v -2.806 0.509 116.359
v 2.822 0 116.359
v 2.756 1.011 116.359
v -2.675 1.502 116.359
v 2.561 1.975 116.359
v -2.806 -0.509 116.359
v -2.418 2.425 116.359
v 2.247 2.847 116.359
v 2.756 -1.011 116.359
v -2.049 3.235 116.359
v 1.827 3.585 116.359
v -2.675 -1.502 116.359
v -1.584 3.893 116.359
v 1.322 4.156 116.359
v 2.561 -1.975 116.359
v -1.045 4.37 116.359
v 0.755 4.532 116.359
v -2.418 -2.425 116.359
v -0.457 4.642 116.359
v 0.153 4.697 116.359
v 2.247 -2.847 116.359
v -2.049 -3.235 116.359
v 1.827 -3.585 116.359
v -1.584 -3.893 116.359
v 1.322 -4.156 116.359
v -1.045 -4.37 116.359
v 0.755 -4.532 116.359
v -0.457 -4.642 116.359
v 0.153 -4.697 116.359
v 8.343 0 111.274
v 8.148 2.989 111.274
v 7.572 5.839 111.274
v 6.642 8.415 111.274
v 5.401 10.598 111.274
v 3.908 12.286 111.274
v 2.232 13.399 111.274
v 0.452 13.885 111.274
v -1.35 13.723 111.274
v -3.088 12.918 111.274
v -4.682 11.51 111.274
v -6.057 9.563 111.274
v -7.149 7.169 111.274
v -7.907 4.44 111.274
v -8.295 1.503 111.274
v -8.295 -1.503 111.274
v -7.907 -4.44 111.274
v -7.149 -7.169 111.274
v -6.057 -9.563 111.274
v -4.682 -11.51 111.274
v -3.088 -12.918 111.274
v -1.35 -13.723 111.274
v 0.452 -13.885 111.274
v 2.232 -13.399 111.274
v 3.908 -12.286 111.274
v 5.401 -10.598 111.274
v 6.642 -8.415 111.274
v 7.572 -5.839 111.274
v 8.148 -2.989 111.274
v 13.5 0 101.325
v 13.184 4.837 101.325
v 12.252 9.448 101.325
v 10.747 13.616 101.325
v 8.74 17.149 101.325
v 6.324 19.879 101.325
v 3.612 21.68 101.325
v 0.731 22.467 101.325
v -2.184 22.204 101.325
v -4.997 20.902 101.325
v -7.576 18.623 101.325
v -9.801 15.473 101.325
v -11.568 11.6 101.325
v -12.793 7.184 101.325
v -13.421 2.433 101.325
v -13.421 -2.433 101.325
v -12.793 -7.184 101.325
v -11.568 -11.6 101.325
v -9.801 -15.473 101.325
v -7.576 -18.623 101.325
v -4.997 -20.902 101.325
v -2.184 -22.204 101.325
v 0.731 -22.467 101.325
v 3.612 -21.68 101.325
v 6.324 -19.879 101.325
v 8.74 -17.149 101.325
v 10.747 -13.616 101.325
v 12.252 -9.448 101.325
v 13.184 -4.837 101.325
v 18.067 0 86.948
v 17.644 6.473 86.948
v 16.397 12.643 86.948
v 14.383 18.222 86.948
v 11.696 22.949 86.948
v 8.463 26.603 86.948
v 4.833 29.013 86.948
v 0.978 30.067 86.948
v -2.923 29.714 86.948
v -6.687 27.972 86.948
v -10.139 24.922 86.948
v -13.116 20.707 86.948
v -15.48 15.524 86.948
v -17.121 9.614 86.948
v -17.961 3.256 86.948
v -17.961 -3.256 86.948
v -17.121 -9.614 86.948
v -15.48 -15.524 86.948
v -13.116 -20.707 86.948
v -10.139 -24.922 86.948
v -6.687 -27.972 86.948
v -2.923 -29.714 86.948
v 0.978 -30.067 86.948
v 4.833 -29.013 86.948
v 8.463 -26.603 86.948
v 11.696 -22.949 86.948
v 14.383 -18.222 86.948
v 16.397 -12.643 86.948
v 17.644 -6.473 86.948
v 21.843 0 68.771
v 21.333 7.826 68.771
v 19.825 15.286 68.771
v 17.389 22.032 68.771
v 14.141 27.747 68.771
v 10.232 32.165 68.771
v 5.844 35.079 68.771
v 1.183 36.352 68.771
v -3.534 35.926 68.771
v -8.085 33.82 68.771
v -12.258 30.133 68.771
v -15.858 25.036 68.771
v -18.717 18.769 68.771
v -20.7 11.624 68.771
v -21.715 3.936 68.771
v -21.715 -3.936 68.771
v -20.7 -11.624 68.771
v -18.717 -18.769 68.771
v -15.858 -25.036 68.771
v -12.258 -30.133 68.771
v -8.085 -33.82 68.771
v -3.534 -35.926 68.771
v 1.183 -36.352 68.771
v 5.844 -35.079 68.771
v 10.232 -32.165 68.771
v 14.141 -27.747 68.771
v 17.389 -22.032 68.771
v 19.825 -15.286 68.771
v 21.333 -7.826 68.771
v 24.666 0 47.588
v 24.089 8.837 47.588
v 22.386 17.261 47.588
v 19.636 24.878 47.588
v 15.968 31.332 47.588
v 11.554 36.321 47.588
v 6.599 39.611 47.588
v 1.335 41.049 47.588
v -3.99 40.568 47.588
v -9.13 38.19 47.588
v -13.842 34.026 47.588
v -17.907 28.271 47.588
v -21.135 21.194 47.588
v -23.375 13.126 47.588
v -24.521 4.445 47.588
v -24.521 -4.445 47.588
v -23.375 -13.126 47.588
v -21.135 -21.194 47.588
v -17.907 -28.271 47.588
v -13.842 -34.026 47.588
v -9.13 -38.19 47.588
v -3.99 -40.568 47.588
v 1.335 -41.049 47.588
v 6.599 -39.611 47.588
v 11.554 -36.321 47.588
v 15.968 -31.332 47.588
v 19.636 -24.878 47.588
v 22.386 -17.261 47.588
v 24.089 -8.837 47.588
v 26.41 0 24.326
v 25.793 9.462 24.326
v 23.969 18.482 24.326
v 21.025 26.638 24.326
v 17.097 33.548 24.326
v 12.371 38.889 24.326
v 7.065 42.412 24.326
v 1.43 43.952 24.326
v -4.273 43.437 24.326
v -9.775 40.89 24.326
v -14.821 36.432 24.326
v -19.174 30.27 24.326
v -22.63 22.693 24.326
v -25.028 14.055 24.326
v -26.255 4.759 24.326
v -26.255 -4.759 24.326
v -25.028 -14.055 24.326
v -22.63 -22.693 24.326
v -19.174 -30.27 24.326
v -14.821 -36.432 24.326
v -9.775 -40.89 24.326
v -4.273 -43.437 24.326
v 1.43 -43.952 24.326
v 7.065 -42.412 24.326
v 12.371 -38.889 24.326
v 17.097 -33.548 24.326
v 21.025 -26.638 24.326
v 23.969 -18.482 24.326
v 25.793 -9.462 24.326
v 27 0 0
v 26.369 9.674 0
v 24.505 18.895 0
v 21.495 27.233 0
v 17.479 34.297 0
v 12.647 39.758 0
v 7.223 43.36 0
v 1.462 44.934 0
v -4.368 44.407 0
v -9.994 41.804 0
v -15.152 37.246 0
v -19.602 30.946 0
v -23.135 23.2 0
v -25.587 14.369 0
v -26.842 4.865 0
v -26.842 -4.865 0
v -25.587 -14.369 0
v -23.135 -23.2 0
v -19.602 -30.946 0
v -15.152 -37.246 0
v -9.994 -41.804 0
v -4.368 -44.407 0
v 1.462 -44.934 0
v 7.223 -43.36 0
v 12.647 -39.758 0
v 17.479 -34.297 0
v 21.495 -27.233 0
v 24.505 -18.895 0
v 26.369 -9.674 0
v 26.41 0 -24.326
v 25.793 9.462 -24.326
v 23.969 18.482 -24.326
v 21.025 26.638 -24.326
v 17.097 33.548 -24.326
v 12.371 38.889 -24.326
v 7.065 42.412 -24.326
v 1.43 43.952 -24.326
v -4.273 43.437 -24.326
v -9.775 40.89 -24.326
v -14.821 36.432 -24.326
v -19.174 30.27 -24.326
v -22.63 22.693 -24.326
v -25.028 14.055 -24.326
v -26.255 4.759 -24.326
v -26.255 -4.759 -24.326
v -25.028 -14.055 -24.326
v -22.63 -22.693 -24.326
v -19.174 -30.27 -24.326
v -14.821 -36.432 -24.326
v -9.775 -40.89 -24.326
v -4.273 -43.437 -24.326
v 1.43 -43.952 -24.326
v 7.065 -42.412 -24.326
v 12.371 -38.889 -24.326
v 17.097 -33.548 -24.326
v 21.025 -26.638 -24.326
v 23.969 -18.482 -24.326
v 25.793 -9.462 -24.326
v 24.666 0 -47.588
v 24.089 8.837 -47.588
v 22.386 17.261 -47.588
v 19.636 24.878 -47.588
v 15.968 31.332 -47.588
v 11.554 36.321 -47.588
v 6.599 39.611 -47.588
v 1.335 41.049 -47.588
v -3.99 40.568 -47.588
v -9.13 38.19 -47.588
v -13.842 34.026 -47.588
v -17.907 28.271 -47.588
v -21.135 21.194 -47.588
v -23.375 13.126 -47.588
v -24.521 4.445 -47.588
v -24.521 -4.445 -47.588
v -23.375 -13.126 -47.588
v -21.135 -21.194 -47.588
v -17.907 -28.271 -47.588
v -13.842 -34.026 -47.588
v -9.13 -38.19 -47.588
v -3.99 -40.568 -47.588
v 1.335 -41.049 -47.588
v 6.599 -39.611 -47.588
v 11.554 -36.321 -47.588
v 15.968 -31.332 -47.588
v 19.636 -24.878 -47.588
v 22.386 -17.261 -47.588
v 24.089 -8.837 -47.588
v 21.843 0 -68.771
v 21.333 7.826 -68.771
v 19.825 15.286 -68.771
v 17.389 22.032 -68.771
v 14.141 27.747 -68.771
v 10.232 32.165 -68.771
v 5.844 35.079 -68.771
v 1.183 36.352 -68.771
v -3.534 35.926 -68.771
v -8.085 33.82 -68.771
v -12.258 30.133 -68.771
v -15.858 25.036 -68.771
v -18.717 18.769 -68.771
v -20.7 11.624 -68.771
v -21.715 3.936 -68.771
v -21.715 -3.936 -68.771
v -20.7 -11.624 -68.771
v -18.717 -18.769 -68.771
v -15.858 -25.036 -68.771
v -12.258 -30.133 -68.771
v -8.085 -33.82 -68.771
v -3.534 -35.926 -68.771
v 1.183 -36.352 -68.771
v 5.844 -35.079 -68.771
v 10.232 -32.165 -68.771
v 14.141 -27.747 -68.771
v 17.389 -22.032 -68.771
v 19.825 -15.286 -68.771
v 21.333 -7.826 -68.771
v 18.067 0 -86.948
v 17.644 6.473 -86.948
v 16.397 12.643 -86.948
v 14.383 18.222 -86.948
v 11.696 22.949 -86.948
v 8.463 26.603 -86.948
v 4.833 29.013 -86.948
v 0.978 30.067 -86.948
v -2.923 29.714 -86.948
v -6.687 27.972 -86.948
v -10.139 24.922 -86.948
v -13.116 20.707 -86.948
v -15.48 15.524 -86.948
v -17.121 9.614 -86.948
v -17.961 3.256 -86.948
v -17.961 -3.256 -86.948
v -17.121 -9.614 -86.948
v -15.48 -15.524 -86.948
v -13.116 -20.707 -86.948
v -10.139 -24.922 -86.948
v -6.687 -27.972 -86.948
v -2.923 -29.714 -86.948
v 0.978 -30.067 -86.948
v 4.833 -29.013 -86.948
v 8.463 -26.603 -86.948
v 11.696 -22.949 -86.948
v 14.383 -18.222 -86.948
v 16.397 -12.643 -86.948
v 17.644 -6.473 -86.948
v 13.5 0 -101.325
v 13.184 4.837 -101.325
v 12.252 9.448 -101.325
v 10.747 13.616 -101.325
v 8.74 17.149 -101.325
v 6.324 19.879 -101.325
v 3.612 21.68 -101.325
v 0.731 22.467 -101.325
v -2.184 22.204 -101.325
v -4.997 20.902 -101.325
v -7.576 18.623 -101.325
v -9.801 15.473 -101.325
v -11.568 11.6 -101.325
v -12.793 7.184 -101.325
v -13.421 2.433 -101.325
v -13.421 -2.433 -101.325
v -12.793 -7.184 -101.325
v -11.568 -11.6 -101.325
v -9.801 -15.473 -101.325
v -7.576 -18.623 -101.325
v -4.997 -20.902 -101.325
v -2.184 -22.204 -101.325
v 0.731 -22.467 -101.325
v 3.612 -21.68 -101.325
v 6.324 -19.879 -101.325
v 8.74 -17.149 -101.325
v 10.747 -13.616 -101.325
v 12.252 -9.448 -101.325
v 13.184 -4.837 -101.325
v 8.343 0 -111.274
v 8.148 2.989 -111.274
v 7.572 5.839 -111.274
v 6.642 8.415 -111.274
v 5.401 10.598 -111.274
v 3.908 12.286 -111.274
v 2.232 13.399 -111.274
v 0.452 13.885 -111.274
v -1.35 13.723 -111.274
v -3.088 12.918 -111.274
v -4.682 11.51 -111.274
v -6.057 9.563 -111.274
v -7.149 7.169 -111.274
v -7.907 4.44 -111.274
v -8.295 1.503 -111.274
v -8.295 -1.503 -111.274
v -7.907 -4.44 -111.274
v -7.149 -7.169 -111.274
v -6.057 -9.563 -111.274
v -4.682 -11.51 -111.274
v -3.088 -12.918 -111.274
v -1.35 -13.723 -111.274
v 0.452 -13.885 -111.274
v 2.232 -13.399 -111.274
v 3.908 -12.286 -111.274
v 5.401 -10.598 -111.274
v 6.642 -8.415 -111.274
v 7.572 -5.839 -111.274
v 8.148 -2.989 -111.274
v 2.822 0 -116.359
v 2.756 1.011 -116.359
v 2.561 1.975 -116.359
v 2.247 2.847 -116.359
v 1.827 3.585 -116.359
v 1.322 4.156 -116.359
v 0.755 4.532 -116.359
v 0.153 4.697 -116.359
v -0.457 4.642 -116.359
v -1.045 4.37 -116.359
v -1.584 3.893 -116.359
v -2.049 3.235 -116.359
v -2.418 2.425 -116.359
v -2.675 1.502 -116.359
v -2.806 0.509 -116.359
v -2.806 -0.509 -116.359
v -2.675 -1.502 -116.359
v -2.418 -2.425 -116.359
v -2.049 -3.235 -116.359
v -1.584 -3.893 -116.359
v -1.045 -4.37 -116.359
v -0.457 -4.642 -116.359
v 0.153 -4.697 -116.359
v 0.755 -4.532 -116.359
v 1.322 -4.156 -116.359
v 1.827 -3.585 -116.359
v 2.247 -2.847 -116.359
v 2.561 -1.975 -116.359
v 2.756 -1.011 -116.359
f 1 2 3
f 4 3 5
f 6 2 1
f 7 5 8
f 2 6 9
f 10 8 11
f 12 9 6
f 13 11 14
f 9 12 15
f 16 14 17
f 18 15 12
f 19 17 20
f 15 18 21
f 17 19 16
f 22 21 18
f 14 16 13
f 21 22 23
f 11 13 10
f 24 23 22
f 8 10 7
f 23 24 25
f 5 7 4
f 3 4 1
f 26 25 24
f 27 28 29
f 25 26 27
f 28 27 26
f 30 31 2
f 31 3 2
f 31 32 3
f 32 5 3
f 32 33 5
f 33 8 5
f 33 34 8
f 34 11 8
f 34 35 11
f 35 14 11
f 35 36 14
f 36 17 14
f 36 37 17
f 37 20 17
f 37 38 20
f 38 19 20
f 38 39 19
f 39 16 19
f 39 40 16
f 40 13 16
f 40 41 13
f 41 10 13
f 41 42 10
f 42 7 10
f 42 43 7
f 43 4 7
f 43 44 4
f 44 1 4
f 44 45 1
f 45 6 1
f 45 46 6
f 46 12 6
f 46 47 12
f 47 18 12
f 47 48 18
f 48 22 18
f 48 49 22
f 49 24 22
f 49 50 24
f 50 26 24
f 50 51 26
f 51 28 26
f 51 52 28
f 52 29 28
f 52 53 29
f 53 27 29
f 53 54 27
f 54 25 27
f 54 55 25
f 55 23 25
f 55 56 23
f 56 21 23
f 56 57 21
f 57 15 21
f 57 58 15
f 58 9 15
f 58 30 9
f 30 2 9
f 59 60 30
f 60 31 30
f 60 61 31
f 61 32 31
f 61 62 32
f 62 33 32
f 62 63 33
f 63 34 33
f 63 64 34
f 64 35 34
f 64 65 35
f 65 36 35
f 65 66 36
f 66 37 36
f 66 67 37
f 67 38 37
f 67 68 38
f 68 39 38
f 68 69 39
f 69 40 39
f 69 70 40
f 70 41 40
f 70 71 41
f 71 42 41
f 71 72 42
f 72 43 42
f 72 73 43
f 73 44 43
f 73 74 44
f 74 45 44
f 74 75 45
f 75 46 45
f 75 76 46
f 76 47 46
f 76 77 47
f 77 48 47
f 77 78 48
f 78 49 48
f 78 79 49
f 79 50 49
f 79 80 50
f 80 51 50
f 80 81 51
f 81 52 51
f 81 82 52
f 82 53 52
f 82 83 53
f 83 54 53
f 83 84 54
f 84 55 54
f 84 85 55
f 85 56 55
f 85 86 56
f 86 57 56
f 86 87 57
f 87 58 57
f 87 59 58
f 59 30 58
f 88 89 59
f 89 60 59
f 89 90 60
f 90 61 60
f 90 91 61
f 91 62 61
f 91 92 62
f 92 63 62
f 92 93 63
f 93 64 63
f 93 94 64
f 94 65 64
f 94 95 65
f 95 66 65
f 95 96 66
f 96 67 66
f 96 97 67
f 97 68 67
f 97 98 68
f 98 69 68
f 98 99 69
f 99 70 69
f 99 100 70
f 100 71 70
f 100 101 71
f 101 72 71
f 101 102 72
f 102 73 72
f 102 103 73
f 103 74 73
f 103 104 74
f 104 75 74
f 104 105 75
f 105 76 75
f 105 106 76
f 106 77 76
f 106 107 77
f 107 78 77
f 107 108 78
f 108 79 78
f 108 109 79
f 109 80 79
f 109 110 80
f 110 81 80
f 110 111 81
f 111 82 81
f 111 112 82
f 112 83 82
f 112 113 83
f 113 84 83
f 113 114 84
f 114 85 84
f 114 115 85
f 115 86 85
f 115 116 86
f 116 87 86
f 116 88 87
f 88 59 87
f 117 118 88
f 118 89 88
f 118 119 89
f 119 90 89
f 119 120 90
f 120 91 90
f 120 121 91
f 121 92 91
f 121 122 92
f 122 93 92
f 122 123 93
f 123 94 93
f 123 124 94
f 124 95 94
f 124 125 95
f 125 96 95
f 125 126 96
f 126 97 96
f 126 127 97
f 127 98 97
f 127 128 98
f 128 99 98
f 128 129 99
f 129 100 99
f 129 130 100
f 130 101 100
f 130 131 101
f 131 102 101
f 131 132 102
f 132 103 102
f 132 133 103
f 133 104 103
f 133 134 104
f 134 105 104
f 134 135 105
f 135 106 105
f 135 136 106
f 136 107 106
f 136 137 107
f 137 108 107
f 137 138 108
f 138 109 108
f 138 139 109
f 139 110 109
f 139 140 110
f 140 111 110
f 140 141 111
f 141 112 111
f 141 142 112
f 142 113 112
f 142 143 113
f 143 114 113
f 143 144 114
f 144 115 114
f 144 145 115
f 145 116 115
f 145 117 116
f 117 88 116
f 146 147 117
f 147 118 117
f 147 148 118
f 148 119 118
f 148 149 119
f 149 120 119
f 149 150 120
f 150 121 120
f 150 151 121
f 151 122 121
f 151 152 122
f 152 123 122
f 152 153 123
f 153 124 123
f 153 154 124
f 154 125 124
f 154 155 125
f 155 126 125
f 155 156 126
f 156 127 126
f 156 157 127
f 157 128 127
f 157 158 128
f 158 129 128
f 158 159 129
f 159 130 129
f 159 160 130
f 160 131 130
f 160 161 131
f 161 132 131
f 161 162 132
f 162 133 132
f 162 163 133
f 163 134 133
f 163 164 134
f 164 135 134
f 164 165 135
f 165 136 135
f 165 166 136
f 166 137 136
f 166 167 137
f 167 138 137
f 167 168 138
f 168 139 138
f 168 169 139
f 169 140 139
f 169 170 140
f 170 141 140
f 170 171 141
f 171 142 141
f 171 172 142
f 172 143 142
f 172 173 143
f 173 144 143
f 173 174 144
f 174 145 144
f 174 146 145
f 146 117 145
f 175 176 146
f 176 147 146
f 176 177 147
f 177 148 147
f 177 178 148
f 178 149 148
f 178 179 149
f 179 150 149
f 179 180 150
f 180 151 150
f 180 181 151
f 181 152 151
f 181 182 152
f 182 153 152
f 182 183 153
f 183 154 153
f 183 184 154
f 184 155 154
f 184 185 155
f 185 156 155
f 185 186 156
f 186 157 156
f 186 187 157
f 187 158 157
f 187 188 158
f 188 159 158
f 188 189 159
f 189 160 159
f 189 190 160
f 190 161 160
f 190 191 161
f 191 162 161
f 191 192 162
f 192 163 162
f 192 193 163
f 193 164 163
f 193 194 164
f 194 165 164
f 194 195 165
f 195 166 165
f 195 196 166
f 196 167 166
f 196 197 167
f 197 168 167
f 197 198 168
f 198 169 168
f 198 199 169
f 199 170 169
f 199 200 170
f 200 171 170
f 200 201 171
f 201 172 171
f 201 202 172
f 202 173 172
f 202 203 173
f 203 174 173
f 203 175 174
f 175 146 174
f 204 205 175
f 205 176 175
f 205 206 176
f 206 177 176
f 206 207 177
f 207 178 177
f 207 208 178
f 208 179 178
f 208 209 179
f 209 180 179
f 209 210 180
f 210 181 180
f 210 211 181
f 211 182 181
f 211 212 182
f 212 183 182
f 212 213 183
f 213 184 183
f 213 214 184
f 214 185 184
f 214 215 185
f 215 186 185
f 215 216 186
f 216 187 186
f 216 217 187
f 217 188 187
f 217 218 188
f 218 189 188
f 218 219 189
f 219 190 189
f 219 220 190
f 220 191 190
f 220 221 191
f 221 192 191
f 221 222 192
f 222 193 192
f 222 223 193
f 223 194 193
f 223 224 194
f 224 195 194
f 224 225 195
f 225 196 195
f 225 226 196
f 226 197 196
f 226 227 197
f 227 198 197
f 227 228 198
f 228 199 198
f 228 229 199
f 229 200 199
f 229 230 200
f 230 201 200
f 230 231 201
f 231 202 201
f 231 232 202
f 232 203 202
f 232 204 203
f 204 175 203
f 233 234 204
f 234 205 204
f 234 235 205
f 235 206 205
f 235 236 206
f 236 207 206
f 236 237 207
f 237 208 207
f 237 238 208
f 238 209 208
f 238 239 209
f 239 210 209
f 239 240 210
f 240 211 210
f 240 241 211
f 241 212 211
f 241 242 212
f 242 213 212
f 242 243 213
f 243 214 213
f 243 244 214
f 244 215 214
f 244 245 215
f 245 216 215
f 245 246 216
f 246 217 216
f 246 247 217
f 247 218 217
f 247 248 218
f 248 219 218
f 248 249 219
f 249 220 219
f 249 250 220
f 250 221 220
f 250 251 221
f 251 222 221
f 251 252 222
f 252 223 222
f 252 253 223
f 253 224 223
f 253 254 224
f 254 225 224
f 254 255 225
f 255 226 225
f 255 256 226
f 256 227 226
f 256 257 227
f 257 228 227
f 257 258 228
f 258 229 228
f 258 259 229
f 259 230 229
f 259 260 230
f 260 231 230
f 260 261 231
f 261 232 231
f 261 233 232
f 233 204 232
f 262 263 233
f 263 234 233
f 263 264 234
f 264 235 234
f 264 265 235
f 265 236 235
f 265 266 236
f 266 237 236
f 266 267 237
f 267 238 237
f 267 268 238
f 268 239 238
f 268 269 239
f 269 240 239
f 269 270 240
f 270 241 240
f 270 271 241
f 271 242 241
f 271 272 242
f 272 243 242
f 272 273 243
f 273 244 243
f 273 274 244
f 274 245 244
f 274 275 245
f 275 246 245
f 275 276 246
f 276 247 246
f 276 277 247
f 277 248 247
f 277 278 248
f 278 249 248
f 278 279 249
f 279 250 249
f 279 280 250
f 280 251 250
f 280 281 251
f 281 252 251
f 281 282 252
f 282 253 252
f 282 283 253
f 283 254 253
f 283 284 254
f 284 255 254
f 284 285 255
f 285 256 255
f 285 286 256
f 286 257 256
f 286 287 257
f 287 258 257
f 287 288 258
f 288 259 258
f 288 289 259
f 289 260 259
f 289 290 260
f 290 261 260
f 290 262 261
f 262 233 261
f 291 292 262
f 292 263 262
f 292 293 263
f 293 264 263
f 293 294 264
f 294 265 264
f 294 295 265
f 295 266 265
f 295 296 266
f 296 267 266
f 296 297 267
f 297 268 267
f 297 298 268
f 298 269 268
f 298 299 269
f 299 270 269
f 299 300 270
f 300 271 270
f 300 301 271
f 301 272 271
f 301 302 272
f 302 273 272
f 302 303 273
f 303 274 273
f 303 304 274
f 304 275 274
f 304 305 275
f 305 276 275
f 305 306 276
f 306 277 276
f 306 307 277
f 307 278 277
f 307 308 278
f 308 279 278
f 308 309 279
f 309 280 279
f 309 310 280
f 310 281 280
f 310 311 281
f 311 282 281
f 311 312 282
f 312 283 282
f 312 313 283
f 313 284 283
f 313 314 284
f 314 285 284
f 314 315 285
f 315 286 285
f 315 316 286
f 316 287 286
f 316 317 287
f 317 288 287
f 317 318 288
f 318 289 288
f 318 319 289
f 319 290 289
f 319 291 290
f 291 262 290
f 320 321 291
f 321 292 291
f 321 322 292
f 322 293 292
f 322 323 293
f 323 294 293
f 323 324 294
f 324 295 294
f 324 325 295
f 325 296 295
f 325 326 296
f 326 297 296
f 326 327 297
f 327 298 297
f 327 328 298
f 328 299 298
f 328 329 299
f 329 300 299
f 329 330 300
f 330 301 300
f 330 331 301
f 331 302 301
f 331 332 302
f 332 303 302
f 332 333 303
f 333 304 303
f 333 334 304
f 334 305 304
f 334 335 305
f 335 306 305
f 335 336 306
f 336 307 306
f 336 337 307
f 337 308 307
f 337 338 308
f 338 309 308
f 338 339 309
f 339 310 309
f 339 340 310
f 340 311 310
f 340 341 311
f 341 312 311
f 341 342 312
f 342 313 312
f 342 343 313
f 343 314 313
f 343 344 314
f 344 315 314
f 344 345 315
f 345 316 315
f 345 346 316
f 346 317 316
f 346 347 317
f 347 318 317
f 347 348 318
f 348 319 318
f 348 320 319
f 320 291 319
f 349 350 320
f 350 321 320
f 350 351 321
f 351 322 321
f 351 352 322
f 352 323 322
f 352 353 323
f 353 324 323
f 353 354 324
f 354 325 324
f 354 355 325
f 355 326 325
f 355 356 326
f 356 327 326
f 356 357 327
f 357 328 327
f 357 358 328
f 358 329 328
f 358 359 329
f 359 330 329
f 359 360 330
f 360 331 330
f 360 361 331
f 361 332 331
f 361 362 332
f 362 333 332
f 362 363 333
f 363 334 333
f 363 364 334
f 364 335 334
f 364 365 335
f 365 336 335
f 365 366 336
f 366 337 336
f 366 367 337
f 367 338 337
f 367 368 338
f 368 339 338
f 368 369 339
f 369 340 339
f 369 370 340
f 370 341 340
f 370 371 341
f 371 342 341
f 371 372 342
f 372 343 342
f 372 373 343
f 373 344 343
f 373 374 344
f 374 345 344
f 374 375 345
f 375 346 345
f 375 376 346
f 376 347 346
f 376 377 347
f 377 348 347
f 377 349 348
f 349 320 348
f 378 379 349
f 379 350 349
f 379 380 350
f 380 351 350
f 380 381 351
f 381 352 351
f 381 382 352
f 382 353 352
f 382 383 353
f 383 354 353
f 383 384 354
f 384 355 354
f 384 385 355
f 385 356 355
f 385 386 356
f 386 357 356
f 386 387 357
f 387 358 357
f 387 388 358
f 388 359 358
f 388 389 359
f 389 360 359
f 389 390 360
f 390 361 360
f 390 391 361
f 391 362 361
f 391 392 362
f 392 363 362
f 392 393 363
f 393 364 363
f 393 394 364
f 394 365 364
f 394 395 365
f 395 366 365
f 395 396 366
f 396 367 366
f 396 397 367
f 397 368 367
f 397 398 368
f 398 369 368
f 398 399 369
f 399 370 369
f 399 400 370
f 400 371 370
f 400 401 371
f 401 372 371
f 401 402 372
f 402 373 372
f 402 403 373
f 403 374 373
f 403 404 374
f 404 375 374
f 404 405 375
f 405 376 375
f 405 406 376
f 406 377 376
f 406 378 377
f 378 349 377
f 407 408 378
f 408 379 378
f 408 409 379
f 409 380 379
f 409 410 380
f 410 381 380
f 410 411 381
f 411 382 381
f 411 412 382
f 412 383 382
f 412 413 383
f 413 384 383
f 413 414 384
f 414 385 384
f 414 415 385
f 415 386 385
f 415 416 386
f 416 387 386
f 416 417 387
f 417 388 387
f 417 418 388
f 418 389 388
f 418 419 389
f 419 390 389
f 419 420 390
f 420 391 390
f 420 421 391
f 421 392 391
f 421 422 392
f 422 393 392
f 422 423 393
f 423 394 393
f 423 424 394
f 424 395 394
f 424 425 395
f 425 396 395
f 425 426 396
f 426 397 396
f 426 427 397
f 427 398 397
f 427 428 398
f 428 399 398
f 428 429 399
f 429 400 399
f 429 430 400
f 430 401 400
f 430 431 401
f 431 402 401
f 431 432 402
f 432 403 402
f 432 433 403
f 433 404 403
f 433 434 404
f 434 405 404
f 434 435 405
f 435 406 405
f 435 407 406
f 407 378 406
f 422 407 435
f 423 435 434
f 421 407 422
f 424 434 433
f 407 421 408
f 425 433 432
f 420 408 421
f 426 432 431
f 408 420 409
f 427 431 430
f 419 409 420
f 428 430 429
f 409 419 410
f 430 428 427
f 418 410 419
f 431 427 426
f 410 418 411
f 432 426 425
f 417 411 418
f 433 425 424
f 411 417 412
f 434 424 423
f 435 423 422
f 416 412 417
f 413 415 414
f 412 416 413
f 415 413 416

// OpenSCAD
// Generated by SolidPython 1.0.1 on 2020-07-29 00:46:45


scale(v = [3, 5, 13]) {
	sphere(r = 9);
}
/***********************************************
*********      SolidPython code:      **********
************************************************
 
# import packages: SolidPython
from solid import *
from solid.utils import *
from itertools import chain, combinations, permutations


class Resize:

    def __init__(self, scad_file):
        self.scad_file = scad_file
        #self.scad_file = import_scad(scad_file)
        # cone/cylinder param:
        self.r1 = 0
        self.r2 = 0
        self.h = 0
        # rectangular prism param:
        self.w = 0
        self.l = 0
        # ellipse param:
        self.r = 0

    # import OpenScad code (file name corresponds to shape)


    # classify shape + parameters
    def assign(self, param1, param2, param3):
        if self.scad_file == 'cone.scad':
            self.r1 = param1
            self.r2 = param2
            self.h = param3
        elif self.scad_file == 'cylinder.scad':
            self.r1 = param1
            self.r2 = param2
            self.h = param3
        elif self.scad_file == 'rectangularPrism.scad':
            self.h = param1
            self.l = param2
            self.w = param3
        else:
            self.r = param1
            self.h = param2

    # resize parameters
    def iterate(self):
        x = range(3, 20, 2)
        i = 1
        if self.scad_file == 'cone.scad':
            tempList = list(permutations(x, 2))
            for temp in tempList:
                param1 = temp[0]
                param2 = temp[1]
                filepath = 'produced_scad_files/' + 'cone' + str(param1) + '_' + str(param2) + '_' + '.scad'
                scad_render_to_file(cylinder(h=param1, r1=param2, r2=0), filepath)

        elif self.scad_file == 'cylinder.scad':
            tempList = list(permutations(x, 3))
            for temp in tempList:
                param1 = temp[0]
                param2 = temp[1]
                filepath = 'produced_scad_files/' + 'cylinder' + str(param1) + '_' + str(param2) + '_' + '.scad'
                scad_render_to_file(cylinder(h=param1, r1=param2, r2=param2), filepath)

        elif self.scad_file == 'rectangularPrism.scad':
            tempList = list(permutations(x, 3))
            for temp in tempList:
                param1 = temp[0]
                param2 = temp[1]
                param3 = temp[2]
                filepath = 'produced_scad_files/' + 'rectangularPrism' + str(param1) + '_' + str(param2) + '_' + str(
                    param3) + '.scad'
                scad_render_to_file(cube(size=(param1, param2, param3)), filepath)

        elif self.scad_file == 'ellipse.scad':
            tempList = list(permutations(x, 4))
            for temp in tempList:
                param1 = temp[0]
                param2 = temp[1]
                param3 = temp[2]
                param4 = temp[3]
                filepath = 'produced_scad_files/' + 'ellipse' + str(param1) + '_' + str(param2) + '_' + str(param3) + '_' + str(param4) + '.scad'
                scad_render_to_file(scale([param1, param2, param3])(sphere(r=param4)), filepath)

    def render_to_scadfile(self):
        scad_render_to_file(scad, 'example.scad') 
 
************************************************/
